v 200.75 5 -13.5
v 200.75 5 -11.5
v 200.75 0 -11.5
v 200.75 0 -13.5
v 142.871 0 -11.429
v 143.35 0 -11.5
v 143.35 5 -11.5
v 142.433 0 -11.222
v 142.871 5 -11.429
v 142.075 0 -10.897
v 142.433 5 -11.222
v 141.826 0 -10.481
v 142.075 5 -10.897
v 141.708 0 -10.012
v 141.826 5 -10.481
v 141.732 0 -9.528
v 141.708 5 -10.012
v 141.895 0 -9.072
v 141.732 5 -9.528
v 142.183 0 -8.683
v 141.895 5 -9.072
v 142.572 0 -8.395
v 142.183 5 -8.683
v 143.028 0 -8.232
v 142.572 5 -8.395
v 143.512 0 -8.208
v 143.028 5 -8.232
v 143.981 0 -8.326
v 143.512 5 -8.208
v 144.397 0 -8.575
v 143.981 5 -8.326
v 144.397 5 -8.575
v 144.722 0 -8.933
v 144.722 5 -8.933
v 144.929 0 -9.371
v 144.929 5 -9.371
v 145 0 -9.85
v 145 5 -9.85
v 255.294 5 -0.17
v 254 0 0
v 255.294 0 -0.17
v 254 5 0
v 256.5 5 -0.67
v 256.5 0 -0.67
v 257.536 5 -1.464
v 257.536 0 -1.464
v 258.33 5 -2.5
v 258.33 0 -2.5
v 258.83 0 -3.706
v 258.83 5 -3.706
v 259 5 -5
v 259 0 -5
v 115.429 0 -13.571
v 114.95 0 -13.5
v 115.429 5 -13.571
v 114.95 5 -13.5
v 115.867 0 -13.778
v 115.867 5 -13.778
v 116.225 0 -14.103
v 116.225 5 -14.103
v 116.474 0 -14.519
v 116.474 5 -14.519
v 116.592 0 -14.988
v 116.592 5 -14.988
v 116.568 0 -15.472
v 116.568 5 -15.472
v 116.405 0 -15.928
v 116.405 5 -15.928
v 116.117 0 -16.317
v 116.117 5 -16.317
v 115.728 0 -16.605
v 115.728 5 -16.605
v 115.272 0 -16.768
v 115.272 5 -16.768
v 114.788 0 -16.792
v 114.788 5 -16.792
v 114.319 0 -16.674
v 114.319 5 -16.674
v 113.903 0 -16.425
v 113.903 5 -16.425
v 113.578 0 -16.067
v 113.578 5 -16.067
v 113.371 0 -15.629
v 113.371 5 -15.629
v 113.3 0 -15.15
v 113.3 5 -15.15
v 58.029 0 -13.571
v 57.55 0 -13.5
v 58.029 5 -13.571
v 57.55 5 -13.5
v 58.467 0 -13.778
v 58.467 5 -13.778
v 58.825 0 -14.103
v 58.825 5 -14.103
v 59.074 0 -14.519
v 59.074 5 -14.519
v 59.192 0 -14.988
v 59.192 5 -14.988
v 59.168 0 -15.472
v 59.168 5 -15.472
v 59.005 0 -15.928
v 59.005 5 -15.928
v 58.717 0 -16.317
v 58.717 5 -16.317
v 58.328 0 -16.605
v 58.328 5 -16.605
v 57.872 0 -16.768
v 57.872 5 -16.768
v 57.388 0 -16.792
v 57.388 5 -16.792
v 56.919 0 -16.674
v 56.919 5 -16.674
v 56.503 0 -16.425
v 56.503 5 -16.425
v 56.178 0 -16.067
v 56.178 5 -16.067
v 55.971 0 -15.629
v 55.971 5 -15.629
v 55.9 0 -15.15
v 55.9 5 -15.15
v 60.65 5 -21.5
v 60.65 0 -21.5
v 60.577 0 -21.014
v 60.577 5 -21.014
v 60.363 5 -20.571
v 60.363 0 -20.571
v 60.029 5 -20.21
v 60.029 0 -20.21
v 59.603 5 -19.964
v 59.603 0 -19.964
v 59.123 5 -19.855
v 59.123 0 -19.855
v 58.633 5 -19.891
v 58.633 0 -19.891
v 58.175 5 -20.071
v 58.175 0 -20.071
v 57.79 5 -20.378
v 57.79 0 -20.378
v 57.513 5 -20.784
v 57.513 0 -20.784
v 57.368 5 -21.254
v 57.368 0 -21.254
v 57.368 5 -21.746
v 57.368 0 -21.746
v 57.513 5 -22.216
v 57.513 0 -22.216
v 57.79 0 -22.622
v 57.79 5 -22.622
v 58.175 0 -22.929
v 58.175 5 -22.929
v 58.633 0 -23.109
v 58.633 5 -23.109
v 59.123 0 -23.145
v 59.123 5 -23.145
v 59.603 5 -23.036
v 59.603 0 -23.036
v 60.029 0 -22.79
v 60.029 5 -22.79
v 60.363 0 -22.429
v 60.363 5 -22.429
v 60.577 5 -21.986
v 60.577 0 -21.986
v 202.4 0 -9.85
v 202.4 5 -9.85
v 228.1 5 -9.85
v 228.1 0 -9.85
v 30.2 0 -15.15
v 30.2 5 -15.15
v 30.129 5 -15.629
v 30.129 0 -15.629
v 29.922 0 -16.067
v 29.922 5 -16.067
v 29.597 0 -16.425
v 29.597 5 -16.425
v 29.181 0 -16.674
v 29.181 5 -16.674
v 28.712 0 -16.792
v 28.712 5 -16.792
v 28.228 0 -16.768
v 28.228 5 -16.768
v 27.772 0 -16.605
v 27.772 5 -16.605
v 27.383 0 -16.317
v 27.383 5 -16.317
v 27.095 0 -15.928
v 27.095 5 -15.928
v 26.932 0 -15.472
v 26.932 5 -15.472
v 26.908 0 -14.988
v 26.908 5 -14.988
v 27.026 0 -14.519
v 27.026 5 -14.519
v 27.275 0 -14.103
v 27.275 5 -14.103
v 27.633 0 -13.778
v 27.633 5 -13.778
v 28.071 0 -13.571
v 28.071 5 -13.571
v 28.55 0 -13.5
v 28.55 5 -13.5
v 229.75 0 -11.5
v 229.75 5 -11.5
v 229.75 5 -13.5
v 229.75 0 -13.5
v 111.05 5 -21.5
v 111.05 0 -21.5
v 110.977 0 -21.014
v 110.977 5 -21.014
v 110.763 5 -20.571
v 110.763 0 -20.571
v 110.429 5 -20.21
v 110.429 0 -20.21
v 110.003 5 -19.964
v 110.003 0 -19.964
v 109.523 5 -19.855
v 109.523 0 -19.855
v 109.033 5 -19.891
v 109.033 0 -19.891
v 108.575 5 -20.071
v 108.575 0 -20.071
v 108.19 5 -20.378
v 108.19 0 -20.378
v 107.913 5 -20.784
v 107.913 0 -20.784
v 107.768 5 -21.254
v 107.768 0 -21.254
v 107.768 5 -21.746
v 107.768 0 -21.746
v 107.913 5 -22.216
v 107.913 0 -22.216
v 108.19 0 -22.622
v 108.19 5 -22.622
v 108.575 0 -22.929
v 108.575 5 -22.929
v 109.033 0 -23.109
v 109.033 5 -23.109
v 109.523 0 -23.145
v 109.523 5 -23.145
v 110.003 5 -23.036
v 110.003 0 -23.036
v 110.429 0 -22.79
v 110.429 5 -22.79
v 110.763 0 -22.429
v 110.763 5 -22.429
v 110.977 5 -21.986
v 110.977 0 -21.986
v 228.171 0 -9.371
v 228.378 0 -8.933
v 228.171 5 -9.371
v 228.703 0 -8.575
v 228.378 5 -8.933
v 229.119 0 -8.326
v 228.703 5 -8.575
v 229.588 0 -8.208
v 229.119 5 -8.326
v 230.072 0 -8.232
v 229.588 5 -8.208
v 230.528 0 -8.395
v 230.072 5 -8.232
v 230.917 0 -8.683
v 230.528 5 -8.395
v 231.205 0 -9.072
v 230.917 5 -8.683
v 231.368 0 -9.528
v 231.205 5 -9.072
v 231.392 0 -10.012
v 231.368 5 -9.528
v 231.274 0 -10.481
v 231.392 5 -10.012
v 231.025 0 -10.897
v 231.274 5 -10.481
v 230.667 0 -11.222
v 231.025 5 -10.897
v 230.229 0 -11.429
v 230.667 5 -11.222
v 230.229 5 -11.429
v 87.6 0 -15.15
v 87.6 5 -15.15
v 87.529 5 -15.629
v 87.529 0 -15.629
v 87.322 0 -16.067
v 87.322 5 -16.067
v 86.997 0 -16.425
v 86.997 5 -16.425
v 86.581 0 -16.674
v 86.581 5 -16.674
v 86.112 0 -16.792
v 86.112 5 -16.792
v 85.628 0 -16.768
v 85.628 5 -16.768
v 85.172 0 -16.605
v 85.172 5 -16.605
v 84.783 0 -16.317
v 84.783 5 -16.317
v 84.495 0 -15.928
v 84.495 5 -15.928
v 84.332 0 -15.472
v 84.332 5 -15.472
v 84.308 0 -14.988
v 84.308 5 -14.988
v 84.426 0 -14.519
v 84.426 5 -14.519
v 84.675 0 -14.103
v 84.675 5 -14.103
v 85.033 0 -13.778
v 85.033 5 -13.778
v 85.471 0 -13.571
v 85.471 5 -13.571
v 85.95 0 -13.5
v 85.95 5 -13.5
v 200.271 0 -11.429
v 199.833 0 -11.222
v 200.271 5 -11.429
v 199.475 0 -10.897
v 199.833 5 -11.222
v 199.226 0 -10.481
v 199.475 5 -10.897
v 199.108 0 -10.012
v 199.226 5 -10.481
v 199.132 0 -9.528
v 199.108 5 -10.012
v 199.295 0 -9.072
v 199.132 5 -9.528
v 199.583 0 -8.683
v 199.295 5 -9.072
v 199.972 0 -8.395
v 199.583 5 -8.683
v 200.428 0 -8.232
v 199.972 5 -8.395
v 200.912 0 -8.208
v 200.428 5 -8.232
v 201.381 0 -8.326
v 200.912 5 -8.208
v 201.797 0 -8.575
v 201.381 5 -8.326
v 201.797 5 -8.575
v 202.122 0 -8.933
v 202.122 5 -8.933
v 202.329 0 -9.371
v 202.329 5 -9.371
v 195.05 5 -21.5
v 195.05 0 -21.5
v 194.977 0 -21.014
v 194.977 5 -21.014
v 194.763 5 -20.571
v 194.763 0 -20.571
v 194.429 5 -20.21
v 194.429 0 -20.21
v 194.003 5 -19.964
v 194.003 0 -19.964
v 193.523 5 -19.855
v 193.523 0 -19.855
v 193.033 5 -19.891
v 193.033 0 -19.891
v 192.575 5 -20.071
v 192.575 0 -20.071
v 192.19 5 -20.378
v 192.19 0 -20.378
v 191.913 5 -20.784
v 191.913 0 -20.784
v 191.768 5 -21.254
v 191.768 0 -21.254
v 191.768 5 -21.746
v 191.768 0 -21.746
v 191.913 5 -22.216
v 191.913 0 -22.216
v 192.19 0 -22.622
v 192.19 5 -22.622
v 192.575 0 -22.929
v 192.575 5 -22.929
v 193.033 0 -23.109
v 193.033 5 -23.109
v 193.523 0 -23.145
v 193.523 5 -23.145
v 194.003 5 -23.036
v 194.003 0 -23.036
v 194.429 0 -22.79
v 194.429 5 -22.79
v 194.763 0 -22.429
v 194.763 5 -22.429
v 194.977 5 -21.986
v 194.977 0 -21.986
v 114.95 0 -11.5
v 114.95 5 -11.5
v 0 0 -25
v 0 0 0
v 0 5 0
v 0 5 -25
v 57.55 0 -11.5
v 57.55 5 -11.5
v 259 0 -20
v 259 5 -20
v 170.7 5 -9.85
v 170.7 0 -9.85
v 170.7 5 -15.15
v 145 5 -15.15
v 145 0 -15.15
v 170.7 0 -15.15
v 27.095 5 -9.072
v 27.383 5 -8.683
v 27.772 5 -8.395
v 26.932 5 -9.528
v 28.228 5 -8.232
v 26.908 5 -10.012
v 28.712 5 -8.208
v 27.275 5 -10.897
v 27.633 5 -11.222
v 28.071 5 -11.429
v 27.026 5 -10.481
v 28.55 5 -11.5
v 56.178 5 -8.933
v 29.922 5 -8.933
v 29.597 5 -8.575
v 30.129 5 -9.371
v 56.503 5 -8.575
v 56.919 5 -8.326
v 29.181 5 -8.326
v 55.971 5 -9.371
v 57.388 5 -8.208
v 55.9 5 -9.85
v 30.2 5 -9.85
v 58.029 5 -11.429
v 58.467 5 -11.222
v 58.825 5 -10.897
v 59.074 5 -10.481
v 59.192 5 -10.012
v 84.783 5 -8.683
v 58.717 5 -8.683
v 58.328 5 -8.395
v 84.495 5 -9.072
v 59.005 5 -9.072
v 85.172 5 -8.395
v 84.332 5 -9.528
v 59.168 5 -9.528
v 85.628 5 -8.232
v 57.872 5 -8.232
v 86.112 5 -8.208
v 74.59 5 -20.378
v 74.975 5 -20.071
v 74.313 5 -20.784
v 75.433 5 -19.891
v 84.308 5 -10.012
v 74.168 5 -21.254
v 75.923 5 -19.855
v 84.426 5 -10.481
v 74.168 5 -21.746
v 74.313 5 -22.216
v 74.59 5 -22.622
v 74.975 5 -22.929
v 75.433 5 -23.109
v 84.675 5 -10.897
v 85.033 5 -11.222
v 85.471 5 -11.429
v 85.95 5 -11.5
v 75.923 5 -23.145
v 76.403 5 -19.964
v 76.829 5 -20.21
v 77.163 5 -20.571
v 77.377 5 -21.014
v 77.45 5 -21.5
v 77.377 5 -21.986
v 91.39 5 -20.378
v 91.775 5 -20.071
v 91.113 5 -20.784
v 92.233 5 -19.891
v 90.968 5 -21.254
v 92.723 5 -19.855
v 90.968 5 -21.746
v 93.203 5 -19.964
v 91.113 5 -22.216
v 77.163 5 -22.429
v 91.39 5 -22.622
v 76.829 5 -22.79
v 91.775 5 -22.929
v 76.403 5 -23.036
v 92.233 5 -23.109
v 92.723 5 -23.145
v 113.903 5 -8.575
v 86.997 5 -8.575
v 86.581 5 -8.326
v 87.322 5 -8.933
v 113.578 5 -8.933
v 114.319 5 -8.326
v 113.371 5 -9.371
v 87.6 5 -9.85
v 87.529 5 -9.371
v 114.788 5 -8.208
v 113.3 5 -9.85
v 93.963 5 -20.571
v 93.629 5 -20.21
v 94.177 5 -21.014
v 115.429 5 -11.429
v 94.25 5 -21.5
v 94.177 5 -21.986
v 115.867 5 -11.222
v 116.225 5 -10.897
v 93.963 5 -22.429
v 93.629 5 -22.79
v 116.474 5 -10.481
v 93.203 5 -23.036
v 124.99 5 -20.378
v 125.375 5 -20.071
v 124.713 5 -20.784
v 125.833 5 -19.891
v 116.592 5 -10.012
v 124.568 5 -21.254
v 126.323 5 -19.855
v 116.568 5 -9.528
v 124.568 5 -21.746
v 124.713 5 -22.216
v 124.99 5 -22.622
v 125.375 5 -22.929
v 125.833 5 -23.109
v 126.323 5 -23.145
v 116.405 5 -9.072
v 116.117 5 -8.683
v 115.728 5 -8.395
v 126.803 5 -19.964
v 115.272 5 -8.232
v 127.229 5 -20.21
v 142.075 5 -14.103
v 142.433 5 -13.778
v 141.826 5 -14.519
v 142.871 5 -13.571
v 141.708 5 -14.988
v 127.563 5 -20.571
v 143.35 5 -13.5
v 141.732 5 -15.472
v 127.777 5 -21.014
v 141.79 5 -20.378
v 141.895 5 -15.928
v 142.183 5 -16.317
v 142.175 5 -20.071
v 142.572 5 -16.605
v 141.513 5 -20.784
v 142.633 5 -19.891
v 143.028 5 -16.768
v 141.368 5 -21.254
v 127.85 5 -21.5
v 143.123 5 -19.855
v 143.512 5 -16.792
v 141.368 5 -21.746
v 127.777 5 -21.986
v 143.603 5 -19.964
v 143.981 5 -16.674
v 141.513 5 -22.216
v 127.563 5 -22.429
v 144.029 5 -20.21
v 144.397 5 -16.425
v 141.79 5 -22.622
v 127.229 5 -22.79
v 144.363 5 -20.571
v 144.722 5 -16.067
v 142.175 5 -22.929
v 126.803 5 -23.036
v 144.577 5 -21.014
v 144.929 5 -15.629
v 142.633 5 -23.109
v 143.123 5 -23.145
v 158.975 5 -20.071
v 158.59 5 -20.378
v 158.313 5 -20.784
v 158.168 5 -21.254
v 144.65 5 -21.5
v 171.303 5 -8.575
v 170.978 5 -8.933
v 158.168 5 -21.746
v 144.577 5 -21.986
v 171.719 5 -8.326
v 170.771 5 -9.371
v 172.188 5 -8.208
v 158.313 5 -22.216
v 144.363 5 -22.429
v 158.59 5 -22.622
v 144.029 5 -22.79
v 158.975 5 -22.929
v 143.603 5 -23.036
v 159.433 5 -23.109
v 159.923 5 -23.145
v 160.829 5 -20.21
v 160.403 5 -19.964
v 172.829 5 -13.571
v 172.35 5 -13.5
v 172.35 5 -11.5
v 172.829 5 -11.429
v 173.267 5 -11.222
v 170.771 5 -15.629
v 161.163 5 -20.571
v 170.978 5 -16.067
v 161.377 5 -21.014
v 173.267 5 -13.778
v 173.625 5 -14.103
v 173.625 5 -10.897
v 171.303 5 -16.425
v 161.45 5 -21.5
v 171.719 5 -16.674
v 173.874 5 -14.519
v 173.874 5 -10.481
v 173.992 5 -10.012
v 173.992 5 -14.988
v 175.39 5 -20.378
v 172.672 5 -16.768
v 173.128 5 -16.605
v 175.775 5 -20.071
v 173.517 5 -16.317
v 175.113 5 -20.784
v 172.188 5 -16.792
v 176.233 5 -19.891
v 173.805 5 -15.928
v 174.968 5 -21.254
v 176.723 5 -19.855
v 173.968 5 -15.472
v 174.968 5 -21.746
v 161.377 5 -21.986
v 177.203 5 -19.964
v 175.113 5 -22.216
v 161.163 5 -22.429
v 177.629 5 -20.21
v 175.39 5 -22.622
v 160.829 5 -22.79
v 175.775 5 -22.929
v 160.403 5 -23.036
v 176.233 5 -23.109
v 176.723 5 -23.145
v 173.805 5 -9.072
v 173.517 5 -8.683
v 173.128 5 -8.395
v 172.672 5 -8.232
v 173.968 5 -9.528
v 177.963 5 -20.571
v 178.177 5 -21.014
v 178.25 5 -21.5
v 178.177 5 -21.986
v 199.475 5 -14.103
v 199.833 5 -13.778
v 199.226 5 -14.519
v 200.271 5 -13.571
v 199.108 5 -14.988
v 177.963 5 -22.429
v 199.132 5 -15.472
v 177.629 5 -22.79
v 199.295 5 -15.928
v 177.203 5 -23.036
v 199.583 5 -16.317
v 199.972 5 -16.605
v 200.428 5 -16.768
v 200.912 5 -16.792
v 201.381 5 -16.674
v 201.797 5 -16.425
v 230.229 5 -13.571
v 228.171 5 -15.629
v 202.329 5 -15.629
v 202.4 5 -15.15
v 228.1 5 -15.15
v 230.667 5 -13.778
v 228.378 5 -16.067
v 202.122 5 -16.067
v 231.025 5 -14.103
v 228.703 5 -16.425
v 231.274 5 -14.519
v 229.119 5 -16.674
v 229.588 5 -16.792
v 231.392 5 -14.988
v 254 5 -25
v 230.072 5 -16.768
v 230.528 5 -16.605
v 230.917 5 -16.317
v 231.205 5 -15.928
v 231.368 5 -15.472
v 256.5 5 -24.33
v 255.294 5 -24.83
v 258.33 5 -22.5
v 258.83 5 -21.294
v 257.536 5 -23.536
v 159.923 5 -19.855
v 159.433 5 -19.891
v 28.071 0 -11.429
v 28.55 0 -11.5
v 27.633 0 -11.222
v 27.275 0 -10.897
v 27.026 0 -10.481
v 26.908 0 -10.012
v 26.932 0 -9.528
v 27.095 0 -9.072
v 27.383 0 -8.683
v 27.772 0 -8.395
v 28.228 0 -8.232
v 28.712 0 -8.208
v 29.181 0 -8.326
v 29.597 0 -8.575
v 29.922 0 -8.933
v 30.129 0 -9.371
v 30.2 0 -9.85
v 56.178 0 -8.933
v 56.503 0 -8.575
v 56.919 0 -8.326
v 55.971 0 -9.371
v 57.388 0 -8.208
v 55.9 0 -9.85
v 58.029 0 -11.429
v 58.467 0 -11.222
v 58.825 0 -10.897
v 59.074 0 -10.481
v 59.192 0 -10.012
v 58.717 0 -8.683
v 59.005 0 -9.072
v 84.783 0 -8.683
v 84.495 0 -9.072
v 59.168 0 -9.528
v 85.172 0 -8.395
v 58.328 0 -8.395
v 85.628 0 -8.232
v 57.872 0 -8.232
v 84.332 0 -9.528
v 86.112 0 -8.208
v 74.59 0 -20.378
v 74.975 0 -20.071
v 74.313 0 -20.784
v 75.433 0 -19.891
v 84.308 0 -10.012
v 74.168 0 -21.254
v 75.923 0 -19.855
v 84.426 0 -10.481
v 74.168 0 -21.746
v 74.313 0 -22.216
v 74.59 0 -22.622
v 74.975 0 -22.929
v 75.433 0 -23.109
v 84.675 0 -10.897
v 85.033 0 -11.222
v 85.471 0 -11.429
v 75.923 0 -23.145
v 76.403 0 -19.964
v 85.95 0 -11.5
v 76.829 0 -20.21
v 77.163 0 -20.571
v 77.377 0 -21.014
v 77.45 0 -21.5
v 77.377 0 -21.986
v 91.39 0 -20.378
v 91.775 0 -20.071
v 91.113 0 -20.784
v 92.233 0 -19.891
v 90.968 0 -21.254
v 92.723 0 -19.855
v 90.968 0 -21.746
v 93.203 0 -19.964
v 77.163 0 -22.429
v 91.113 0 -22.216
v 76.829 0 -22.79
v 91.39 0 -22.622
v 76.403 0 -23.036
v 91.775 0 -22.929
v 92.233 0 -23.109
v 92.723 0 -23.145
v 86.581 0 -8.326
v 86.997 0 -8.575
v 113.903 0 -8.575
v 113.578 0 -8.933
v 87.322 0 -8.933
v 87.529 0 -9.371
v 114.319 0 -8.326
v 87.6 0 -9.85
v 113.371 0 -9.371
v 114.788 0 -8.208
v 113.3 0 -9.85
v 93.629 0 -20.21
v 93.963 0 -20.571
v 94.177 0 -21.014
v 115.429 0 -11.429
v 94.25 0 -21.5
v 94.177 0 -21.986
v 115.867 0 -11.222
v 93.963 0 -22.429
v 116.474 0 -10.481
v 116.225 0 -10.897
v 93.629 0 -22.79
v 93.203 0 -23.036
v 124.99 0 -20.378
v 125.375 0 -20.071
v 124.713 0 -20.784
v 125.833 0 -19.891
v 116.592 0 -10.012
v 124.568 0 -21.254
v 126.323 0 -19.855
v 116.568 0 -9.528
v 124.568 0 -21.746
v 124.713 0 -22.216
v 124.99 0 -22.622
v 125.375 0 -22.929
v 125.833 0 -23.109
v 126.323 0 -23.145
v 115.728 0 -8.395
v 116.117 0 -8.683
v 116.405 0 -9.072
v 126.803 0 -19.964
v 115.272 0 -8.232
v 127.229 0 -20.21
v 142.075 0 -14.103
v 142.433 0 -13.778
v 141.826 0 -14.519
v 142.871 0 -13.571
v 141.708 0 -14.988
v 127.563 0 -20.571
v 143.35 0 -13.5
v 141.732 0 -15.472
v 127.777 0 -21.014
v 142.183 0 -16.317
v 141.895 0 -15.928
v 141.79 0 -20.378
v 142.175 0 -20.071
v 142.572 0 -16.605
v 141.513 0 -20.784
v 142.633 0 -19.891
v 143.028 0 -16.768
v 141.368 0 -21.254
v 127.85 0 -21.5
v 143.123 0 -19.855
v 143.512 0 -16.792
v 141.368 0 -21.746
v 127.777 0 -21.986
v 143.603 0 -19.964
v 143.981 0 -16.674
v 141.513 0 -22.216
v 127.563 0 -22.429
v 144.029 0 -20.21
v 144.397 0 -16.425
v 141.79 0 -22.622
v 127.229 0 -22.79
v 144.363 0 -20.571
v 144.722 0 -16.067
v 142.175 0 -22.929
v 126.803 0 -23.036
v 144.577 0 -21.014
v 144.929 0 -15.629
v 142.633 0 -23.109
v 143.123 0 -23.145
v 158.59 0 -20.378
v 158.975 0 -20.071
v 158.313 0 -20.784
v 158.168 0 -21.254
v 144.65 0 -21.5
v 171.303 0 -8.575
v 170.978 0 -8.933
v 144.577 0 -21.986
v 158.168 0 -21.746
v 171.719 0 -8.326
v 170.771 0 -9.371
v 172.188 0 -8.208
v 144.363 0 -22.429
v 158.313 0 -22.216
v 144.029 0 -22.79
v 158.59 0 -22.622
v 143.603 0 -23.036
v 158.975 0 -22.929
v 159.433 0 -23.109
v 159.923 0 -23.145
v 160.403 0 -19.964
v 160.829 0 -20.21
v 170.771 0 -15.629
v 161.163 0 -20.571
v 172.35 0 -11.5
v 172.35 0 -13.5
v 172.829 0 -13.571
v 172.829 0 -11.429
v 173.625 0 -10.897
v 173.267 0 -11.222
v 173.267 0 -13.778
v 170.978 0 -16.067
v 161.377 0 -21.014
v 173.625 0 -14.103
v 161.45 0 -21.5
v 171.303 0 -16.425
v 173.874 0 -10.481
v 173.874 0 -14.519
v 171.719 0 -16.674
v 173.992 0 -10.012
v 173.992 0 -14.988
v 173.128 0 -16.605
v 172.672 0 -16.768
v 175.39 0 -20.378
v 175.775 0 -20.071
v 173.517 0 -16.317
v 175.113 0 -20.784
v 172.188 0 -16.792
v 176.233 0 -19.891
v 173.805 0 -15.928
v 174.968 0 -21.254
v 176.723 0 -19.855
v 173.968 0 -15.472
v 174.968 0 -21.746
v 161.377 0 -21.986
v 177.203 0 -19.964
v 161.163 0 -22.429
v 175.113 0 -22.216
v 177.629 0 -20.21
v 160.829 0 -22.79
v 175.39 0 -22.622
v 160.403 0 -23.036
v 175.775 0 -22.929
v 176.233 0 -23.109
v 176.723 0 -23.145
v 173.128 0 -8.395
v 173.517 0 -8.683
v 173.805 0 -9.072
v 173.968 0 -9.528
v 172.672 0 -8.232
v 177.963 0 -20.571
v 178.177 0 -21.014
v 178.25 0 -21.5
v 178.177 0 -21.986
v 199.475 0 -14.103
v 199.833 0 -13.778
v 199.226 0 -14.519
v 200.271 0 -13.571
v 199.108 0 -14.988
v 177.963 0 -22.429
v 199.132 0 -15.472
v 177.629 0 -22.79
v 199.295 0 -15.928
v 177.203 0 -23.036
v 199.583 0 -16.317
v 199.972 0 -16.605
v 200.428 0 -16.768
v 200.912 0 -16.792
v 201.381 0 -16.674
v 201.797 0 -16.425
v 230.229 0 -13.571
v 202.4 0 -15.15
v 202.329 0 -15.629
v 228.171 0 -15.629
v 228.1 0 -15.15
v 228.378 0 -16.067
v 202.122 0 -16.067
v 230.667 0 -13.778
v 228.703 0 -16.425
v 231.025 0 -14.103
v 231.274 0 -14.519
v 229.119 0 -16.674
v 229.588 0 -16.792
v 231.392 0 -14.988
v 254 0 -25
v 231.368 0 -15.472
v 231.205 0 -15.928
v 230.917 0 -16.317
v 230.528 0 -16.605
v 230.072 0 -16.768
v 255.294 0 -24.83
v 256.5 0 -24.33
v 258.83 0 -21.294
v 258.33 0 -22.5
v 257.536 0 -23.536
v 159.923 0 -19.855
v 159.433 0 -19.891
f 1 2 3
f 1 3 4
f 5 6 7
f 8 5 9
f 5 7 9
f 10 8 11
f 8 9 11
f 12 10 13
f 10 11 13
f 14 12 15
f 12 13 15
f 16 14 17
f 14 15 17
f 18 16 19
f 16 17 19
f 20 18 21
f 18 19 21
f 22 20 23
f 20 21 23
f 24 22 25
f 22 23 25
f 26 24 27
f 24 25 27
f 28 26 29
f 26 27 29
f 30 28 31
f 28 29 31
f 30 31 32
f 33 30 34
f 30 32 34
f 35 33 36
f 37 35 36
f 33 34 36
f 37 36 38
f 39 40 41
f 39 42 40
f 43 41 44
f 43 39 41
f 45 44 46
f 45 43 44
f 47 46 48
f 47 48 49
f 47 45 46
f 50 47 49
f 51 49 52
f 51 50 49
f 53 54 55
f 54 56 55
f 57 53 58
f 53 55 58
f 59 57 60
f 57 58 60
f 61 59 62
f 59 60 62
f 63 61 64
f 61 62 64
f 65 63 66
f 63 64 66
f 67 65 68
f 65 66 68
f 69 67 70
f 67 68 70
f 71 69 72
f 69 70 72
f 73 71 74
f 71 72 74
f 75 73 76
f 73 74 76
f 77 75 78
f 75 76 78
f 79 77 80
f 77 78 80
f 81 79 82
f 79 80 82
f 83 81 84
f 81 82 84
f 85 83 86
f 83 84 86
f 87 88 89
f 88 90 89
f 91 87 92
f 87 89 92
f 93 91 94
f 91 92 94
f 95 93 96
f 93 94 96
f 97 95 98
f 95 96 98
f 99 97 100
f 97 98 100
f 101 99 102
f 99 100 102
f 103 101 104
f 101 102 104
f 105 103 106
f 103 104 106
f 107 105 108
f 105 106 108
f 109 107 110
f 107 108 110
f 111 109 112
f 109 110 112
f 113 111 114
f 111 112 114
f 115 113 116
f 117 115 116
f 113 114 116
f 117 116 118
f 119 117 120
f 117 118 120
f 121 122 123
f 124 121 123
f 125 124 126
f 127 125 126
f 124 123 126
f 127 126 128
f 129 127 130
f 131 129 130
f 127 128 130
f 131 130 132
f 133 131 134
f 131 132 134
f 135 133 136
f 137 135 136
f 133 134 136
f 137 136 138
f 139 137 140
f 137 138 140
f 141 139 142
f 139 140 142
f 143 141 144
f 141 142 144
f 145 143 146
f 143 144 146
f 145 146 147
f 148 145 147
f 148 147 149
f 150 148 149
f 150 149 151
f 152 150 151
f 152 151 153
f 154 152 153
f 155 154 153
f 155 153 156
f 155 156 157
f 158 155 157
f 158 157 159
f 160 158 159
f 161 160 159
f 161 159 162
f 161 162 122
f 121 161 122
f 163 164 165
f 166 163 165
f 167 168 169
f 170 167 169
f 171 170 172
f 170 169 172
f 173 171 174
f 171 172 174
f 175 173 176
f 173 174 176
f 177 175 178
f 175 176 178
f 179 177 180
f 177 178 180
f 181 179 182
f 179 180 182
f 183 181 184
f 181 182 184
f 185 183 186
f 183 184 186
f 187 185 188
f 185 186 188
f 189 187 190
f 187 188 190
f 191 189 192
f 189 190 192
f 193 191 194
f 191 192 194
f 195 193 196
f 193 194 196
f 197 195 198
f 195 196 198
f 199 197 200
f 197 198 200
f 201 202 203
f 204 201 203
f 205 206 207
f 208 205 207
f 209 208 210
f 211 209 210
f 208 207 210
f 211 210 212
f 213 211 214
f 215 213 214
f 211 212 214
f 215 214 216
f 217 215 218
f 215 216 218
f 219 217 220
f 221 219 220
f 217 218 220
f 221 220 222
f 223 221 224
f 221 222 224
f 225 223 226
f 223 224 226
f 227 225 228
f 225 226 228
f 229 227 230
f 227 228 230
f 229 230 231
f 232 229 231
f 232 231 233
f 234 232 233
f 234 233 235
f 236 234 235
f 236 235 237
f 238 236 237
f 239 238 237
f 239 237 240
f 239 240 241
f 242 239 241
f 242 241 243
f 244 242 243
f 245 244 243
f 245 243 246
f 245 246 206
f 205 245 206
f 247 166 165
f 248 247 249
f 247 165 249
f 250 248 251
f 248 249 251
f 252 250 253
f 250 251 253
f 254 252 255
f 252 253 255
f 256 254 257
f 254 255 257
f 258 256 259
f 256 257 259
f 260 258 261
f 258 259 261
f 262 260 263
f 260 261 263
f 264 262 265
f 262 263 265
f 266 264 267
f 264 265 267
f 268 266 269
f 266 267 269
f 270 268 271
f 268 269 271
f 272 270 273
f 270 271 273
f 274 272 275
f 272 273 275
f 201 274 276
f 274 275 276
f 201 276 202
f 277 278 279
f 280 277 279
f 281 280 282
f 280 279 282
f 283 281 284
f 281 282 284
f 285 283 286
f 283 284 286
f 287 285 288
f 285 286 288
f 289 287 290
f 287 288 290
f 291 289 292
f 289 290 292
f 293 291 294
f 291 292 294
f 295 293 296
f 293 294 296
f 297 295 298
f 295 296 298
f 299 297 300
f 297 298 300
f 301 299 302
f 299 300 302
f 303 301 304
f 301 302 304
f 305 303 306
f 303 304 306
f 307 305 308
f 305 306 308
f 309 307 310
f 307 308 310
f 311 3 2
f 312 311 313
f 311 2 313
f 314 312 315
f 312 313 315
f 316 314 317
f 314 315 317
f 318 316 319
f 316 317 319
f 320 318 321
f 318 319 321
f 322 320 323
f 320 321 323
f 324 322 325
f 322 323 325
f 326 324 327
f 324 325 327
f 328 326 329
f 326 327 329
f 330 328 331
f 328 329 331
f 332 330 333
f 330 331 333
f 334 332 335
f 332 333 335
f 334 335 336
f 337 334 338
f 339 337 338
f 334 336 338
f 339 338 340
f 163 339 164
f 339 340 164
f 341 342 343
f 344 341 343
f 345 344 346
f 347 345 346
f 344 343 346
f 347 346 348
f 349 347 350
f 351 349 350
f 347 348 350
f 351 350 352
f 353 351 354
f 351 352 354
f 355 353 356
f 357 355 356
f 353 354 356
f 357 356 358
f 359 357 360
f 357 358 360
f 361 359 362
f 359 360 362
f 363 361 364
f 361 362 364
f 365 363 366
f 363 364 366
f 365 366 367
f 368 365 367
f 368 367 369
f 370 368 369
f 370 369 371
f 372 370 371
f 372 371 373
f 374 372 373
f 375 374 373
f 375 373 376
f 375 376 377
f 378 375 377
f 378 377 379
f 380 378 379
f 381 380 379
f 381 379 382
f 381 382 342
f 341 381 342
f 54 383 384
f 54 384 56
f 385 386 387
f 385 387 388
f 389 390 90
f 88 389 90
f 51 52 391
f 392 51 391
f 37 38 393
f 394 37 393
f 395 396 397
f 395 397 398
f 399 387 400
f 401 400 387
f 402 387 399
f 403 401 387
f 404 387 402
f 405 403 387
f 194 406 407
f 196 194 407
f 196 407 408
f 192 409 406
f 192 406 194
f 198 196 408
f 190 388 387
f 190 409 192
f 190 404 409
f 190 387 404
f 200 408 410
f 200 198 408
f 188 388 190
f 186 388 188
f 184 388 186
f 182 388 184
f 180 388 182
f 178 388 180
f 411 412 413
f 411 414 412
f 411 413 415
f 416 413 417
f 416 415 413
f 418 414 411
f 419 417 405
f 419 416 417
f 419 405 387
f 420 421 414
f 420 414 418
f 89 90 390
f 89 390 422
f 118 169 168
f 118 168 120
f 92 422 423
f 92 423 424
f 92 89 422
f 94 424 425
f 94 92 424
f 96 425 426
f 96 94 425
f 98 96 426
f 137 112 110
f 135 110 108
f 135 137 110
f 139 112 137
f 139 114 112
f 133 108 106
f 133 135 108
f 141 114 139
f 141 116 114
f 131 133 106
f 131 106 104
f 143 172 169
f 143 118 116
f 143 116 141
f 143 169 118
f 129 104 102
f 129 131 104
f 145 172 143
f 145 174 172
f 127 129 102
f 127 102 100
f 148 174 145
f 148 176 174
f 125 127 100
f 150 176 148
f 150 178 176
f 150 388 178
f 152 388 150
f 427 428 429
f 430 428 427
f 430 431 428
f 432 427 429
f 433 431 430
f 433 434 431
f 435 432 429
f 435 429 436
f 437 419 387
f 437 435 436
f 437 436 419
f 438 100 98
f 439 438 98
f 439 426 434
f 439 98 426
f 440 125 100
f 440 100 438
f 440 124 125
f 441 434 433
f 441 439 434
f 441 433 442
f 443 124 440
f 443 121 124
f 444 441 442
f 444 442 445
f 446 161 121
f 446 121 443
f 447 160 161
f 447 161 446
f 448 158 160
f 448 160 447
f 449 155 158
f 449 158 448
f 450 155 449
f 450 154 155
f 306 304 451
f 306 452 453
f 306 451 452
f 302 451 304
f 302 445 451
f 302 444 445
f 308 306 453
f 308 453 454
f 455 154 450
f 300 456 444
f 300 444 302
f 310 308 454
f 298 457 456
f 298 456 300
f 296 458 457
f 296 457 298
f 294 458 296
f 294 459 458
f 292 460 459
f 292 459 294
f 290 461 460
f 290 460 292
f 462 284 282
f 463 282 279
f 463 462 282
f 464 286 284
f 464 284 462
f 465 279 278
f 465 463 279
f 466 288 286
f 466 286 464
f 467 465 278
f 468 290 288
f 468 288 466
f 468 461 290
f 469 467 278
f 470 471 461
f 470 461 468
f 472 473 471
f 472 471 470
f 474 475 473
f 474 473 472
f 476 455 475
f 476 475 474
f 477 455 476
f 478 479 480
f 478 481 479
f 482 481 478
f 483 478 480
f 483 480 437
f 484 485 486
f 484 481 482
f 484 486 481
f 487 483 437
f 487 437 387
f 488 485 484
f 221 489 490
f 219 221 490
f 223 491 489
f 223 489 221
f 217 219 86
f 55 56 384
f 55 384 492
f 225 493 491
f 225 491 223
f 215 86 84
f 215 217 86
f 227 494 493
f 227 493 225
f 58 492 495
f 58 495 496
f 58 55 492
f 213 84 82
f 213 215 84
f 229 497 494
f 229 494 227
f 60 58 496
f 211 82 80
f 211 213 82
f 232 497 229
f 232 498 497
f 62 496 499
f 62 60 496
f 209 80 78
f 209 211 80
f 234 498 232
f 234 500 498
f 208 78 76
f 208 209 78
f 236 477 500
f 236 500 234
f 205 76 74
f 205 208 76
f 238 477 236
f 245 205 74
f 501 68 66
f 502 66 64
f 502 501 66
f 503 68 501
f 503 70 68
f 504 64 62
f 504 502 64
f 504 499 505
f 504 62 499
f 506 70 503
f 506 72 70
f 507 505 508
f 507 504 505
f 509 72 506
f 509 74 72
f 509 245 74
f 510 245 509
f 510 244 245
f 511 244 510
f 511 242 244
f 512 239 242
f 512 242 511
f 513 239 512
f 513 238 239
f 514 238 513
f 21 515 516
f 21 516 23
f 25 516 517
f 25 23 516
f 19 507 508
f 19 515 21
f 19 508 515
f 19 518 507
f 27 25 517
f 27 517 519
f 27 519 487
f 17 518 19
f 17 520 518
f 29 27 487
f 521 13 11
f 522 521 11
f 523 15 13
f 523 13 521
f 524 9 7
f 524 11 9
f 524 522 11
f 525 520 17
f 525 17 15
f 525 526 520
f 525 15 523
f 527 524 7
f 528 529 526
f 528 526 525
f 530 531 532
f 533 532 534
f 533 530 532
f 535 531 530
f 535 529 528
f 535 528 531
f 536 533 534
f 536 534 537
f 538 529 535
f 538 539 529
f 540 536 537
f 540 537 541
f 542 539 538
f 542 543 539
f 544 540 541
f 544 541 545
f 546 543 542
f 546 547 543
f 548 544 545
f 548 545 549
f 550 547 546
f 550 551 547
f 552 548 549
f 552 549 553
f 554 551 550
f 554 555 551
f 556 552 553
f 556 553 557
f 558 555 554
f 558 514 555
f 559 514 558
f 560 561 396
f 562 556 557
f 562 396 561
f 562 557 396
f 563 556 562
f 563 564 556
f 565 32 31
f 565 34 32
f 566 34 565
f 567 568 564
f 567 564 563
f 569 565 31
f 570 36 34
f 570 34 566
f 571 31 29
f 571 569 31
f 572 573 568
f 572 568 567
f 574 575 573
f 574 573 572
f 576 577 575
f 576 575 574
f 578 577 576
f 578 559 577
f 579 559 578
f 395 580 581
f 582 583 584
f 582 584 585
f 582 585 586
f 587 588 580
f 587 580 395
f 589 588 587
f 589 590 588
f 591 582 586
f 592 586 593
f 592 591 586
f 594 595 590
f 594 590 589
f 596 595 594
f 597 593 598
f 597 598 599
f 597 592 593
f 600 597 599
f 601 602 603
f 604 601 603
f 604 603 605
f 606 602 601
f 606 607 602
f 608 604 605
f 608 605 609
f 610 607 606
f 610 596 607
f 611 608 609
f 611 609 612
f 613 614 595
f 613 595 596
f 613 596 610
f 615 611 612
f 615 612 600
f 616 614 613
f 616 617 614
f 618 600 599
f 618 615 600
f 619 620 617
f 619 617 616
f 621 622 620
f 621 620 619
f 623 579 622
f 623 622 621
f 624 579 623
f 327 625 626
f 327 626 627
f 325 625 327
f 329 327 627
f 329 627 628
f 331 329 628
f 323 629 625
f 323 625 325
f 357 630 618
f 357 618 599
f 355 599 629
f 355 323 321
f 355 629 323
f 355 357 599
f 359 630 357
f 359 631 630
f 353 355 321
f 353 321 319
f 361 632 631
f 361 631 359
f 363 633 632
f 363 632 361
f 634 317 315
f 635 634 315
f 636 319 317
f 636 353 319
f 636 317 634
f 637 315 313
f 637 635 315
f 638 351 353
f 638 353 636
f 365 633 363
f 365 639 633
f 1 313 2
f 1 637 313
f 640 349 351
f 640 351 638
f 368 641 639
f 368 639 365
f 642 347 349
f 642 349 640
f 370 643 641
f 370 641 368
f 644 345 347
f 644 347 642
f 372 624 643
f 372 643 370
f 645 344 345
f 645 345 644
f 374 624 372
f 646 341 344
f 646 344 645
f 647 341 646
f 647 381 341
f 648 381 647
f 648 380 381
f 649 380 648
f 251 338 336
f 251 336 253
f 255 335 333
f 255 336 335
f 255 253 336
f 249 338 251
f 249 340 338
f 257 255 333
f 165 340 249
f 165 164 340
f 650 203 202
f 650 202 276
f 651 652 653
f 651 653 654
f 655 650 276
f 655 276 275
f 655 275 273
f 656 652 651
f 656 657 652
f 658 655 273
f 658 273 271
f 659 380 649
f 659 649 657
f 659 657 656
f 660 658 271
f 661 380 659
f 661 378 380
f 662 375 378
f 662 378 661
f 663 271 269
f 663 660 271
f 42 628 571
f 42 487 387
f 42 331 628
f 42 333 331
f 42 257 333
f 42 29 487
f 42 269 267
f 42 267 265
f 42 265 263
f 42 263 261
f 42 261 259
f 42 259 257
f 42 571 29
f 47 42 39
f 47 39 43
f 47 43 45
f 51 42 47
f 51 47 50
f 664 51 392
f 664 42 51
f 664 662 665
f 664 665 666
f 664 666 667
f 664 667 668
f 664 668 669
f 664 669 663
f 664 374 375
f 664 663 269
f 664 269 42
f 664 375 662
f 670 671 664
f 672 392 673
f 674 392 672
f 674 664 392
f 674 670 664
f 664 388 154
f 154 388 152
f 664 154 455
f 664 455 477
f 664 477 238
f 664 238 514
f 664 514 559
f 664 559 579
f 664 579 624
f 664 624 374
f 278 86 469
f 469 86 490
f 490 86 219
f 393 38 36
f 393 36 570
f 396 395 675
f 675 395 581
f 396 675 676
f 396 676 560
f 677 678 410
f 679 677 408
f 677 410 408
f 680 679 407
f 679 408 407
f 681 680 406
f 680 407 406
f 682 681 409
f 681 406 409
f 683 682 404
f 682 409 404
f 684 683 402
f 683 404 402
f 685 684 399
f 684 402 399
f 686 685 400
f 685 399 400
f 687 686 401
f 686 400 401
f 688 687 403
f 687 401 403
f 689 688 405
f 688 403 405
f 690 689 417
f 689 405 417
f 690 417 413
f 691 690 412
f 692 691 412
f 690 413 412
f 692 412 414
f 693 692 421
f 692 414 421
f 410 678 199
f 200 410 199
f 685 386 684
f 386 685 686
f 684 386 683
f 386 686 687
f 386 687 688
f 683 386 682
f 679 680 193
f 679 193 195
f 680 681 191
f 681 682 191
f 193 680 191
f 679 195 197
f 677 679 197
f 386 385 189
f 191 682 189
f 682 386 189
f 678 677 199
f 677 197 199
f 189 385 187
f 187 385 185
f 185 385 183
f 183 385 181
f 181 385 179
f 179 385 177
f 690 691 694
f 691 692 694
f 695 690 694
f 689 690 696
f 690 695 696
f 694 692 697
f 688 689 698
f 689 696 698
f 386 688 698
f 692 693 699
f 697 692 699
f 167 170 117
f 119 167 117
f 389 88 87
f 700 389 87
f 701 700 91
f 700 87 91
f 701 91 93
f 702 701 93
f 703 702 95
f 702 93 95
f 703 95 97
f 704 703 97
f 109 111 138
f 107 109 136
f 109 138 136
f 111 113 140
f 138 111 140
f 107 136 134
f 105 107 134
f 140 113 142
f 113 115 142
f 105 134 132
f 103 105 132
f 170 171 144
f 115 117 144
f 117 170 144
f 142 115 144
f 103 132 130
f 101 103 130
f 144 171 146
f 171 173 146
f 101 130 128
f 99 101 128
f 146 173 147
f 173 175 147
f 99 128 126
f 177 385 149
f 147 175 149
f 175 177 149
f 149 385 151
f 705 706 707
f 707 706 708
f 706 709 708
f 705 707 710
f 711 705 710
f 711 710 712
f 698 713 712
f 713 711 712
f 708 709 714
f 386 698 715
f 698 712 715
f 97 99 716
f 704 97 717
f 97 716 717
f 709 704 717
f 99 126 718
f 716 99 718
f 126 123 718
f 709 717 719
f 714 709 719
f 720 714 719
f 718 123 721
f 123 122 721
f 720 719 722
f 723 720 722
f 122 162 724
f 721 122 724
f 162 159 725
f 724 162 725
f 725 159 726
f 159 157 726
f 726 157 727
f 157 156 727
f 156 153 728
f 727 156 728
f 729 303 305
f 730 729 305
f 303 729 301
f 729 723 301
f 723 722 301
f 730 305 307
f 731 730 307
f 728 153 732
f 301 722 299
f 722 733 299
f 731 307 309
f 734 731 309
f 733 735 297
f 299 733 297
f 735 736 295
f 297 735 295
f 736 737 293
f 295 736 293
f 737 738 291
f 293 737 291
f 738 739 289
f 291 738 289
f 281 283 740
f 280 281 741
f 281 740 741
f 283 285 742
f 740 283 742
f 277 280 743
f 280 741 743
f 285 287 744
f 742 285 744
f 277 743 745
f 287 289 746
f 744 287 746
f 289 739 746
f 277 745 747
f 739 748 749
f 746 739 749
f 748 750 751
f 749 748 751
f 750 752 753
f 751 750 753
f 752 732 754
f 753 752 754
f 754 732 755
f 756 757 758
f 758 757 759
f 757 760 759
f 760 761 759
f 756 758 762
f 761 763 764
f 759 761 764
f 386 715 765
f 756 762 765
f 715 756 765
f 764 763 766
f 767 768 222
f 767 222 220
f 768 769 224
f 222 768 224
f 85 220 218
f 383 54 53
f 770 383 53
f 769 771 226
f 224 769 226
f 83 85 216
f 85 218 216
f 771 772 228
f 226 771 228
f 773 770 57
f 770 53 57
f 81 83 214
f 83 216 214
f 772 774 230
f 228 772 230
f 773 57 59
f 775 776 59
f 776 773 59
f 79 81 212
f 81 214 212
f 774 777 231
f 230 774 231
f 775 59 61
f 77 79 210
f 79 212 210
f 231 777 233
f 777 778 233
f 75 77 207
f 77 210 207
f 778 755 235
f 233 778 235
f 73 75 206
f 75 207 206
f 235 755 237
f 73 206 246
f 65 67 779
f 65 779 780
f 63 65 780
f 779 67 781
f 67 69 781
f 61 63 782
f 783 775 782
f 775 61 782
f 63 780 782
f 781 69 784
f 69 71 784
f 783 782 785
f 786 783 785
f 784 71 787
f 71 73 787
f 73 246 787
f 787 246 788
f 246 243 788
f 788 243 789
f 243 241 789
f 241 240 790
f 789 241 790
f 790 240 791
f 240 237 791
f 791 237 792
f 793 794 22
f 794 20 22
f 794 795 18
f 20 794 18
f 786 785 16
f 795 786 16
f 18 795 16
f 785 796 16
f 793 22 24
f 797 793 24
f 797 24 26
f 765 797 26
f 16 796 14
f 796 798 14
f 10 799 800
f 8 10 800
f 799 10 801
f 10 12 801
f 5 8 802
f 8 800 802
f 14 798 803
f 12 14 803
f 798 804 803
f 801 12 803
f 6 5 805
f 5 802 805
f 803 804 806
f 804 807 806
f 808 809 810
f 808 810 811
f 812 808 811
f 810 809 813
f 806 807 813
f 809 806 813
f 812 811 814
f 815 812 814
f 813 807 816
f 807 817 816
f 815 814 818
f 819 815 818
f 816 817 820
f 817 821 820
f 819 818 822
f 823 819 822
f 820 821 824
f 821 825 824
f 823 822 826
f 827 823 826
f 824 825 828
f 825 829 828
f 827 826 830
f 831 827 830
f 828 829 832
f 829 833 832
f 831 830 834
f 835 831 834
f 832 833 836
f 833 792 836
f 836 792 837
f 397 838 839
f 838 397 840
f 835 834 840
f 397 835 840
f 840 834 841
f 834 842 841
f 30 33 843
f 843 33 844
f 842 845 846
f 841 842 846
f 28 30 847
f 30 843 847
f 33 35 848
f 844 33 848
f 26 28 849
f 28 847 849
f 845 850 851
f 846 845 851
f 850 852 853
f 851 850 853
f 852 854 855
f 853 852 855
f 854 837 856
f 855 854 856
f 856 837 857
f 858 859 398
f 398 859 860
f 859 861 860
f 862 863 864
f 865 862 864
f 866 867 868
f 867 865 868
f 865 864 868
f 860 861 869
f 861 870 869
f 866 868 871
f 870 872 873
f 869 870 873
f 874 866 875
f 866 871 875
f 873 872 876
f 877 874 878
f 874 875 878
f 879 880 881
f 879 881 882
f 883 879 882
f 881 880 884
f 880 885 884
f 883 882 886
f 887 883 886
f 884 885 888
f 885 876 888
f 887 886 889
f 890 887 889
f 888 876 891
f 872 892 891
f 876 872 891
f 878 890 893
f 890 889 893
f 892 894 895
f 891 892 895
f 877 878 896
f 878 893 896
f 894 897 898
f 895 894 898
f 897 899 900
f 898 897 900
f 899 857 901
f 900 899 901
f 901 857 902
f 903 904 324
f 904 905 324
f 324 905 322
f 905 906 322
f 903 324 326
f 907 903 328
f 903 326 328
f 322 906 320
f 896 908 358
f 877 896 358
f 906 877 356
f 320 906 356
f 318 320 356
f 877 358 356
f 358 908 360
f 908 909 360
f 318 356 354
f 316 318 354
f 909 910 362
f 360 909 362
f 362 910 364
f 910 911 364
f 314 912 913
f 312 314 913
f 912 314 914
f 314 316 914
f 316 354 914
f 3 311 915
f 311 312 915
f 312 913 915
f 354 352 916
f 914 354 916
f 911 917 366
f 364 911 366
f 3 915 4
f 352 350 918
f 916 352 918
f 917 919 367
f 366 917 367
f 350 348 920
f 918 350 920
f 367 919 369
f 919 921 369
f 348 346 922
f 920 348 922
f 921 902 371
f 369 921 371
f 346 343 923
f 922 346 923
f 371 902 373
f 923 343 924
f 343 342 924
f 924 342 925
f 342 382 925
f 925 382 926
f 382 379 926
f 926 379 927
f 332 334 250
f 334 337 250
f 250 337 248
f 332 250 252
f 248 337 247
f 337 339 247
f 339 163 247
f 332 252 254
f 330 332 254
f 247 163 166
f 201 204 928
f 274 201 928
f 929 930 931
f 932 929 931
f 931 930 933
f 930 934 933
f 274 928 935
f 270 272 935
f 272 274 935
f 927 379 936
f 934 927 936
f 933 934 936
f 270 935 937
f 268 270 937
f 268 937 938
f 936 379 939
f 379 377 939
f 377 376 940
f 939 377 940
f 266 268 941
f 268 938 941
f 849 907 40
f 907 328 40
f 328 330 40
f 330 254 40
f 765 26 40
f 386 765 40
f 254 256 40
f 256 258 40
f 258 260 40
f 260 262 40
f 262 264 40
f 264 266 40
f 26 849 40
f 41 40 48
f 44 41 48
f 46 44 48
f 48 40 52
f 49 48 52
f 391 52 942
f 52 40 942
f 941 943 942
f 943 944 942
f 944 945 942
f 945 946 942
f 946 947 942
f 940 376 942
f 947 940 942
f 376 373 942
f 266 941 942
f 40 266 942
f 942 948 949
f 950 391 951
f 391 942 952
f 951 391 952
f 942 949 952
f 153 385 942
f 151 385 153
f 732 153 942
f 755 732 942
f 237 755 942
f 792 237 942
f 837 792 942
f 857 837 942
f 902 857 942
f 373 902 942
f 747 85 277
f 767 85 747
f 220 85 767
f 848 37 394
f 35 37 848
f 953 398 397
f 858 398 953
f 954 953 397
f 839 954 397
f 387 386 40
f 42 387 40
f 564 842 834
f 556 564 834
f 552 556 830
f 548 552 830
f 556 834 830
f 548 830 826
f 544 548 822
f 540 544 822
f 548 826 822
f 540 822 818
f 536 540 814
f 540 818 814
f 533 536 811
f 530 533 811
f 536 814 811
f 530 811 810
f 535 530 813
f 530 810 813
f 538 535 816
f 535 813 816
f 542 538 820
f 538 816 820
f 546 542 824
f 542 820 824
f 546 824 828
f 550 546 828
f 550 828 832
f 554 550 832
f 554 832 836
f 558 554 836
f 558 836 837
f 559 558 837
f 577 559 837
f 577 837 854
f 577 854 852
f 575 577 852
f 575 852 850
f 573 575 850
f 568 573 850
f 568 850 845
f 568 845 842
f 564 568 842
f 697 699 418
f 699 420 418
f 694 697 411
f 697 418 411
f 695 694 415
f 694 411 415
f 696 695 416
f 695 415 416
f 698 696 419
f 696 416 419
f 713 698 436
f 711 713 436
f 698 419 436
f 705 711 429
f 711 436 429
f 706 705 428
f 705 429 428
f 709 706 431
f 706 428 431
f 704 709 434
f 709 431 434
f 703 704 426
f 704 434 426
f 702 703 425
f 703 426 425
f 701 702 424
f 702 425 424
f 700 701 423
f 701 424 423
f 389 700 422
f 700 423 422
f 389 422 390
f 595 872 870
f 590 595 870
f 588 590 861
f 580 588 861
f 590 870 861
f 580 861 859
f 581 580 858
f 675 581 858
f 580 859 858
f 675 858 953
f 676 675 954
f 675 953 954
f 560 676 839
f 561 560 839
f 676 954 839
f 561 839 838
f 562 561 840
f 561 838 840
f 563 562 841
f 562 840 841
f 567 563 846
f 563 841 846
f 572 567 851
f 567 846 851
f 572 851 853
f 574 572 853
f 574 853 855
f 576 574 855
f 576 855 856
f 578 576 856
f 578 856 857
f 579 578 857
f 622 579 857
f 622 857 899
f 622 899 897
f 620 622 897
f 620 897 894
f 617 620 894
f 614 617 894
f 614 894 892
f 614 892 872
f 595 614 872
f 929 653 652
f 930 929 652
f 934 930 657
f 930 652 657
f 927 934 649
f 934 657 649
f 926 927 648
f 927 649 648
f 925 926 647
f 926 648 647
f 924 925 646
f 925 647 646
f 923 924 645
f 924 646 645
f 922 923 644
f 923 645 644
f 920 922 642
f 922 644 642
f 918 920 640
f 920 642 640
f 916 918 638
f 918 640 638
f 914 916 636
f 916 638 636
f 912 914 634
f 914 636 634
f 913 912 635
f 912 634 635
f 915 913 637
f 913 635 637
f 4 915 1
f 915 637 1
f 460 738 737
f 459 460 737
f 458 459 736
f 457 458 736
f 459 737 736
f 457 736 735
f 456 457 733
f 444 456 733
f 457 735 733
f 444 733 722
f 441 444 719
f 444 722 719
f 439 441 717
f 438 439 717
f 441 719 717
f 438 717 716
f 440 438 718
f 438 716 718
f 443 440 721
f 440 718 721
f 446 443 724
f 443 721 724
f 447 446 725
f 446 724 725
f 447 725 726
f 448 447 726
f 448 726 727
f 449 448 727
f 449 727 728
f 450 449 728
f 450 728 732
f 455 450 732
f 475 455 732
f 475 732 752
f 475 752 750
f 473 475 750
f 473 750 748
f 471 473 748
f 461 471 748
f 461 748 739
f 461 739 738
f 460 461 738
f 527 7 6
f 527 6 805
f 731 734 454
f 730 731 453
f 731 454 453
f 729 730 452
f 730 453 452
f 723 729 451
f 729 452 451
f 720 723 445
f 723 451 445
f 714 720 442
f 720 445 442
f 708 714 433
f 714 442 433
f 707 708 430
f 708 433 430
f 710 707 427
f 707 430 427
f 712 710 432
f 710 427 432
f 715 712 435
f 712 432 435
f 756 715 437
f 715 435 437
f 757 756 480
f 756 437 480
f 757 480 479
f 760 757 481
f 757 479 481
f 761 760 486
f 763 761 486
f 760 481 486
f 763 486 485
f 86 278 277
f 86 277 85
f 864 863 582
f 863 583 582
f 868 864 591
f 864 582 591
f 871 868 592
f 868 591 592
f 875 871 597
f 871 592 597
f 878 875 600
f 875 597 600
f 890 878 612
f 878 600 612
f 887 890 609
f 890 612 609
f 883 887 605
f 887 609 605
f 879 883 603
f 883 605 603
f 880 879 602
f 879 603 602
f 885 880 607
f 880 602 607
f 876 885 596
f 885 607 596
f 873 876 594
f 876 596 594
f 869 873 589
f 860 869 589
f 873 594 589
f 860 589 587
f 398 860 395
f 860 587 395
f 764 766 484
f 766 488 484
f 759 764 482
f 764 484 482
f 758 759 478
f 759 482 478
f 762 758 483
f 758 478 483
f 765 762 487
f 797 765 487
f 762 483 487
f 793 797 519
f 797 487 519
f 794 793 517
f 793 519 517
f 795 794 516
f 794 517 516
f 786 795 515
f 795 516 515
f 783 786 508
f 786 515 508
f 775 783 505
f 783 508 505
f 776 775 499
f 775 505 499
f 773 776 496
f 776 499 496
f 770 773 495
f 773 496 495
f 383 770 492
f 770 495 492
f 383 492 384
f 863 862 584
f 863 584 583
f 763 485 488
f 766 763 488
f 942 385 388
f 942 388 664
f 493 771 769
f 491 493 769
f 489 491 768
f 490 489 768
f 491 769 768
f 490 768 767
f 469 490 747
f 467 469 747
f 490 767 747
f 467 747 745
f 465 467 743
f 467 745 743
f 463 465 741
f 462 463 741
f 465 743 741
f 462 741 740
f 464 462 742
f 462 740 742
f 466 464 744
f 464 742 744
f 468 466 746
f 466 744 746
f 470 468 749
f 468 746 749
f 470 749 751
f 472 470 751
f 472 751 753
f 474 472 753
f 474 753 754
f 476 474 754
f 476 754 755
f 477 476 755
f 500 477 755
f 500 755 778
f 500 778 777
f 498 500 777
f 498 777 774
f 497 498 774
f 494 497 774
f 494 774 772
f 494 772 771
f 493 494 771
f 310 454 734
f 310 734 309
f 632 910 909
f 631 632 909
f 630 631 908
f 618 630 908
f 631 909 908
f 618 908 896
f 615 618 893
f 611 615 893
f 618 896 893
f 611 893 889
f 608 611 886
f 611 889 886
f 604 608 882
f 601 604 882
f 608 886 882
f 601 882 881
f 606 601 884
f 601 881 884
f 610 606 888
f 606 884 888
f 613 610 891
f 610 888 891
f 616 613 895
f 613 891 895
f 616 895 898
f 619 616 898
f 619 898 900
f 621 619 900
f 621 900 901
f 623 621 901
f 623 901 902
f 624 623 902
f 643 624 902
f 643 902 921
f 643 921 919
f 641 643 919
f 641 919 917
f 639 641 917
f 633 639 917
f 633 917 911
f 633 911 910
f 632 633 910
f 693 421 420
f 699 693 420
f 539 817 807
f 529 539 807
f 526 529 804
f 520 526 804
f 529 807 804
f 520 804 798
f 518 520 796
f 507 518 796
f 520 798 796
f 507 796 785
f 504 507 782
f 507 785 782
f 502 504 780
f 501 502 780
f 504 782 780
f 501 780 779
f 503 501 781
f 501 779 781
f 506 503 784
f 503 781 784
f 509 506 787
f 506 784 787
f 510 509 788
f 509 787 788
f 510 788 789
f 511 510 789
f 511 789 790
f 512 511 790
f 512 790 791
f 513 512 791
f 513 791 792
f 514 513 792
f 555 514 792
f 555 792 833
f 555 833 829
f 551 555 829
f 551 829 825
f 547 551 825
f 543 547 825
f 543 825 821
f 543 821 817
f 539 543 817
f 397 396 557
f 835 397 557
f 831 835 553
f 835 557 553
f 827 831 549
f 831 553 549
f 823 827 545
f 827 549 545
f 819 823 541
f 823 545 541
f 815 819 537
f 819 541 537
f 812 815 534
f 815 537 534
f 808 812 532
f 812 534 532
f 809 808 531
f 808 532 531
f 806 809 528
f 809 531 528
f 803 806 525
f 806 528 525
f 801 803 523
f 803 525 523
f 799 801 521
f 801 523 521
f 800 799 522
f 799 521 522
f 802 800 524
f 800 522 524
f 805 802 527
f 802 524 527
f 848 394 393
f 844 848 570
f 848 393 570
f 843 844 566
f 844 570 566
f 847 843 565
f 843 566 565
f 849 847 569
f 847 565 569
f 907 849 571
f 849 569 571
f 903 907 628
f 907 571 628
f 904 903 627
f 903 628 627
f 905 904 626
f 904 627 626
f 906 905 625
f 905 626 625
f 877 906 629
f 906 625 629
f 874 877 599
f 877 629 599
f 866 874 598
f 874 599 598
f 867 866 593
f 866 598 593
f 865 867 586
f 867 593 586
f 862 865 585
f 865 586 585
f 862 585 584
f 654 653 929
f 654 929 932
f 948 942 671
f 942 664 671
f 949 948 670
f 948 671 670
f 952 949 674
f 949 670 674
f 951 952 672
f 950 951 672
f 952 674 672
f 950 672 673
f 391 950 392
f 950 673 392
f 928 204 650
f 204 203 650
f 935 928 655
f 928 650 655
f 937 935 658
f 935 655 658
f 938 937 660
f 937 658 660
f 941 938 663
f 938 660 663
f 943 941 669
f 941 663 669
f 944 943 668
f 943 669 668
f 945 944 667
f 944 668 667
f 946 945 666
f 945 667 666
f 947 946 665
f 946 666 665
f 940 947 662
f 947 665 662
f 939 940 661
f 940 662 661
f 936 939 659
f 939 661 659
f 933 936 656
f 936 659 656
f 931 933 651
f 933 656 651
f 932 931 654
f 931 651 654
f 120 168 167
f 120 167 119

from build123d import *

# Parameters (mm, degrees)
SKETCH1_W           = 259
SKETCH1_H           = 25
BOSS_EXTRUDE1_DEPTH = 5
SKETCH4_W           = 29
SKETCH4_H           = 5.3
CUT_EXTRUDE2_DEPTH  = 6
SKETCH5_R           = 1.65
CUT_EXTRUDE3_DEPTH  = 6
SKETCH6_R           = 1.65
CUT_EXTRUDE4_DEPTH  = 6
FILLET1_R           = 5


with BuildPart() as part:
    # Sketch1 → Boss-Extrude1 (new body)
    with BuildSketch(Plane(origin=(0, 0, 0), x_dir=(1, 0, 0), z_dir=(0, 1, 0))):
        with Locations((129.5, 12.5)):
            Rectangle(SKETCH1_W, SKETCH1_H)
    extrude(amount=BOSS_EXTRUDE1_DEPTH)

    # Sketch4 → Cut-Extrude2 (cut, through all)
    with BuildSketch(Plane(origin=(0, 5, 0), x_dir=(1, 0, 0), z_dir=(0, 1, 0))):
        with Locations((43.05, 12.5)):
            Rectangle(SKETCH4_W, SKETCH4_H)
        with Locations((100.45, 12.5)):
            Rectangle(SKETCH4_W, SKETCH4_H)
        with Locations((157.85, 12.5)):
            Rectangle(SKETCH4_W, SKETCH4_H)
        with Locations((215.25, 12.5)):
            Rectangle(SKETCH4_W, SKETCH4_H)
    extrude(amount=-CUT_EXTRUDE2_DEPTH, mode=Mode.SUBTRACT)

    # Sketch5 → Cut-Extrude3 (cut, through all)
    with BuildSketch(Plane(origin=(0, 5, 0), x_dir=(1, 0, 0), z_dir=(0, 1, 0))):
        with Locations((28.55, 15.15)):
            Circle(SKETCH5_R)
        with Locations((28.55, 9.85)):
            Circle(SKETCH5_R)
        with Locations((57.55, 15.15)):
            Circle(SKETCH5_R)
        with Locations((57.55, 9.85)):
            Circle(SKETCH5_R)
        with Locations((85.95, 15.15)):
            Circle(SKETCH5_R)
        with Locations((85.95, 9.85)):
            Circle(SKETCH5_R)
        with Locations((114.95, 15.15)):
            Circle(SKETCH5_R)
        with Locations((114.95, 9.85)):
            Circle(SKETCH5_R)
        with Locations((143.35, 15.15)):
            Circle(SKETCH5_R)
        with Locations((143.35, 9.85)):
            Circle(SKETCH5_R)
        with Locations((172.35, 15.15)):
            Circle(SKETCH5_R)
        with Locations((172.35, 9.85)):
            Circle(SKETCH5_R)
        with Locations((200.75, 15.15)):
            Circle(SKETCH5_R)
        with Locations((229.75, 15.15)):
            Circle(SKETCH5_R)
        with Locations((229.75, 9.85)):
            Circle(SKETCH5_R)
        with Locations((200.75, 9.85)):
            Circle(SKETCH5_R)
    extrude(amount=-CUT_EXTRUDE3_DEPTH, mode=Mode.SUBTRACT)

    # Sketch6 → Cut-Extrude4 (cut, through all)
    with BuildSketch(Plane.XZ):
        with Locations((193.4, -21.5)):
            Circle(SKETCH6_R)
        with Locations((176.6, -21.5)):
            Circle(SKETCH6_R)
        with Locations((159.8, -21.5)):
            Circle(SKETCH6_R)
        with Locations((143, -21.5)):
            Circle(SKETCH6_R)
        with Locations((126.2, -21.5)):
            Circle(SKETCH6_R)
        with Locations((109.4, -21.5)):
            Circle(SKETCH6_R)
        with Locations((92.6, -21.5)):
            Circle(SKETCH6_R)
        with Locations((75.8, -21.5)):
            Circle(SKETCH6_R)
        with Locations((59, -21.5)):
            Circle(SKETCH6_R)
    extrude(amount=-CUT_EXTRUDE4_DEPTH, mode=Mode.SUBTRACT)

    # Fillet1
    fillet1_edges = [part.edges().sort_by_distance(p)[0] for p in [
        (259, 2.5, -25),
        (259, 2.5, 0),
    ]]
    fillet(fillet1_edges, radius=FILLET1_R)


solid = part.part
